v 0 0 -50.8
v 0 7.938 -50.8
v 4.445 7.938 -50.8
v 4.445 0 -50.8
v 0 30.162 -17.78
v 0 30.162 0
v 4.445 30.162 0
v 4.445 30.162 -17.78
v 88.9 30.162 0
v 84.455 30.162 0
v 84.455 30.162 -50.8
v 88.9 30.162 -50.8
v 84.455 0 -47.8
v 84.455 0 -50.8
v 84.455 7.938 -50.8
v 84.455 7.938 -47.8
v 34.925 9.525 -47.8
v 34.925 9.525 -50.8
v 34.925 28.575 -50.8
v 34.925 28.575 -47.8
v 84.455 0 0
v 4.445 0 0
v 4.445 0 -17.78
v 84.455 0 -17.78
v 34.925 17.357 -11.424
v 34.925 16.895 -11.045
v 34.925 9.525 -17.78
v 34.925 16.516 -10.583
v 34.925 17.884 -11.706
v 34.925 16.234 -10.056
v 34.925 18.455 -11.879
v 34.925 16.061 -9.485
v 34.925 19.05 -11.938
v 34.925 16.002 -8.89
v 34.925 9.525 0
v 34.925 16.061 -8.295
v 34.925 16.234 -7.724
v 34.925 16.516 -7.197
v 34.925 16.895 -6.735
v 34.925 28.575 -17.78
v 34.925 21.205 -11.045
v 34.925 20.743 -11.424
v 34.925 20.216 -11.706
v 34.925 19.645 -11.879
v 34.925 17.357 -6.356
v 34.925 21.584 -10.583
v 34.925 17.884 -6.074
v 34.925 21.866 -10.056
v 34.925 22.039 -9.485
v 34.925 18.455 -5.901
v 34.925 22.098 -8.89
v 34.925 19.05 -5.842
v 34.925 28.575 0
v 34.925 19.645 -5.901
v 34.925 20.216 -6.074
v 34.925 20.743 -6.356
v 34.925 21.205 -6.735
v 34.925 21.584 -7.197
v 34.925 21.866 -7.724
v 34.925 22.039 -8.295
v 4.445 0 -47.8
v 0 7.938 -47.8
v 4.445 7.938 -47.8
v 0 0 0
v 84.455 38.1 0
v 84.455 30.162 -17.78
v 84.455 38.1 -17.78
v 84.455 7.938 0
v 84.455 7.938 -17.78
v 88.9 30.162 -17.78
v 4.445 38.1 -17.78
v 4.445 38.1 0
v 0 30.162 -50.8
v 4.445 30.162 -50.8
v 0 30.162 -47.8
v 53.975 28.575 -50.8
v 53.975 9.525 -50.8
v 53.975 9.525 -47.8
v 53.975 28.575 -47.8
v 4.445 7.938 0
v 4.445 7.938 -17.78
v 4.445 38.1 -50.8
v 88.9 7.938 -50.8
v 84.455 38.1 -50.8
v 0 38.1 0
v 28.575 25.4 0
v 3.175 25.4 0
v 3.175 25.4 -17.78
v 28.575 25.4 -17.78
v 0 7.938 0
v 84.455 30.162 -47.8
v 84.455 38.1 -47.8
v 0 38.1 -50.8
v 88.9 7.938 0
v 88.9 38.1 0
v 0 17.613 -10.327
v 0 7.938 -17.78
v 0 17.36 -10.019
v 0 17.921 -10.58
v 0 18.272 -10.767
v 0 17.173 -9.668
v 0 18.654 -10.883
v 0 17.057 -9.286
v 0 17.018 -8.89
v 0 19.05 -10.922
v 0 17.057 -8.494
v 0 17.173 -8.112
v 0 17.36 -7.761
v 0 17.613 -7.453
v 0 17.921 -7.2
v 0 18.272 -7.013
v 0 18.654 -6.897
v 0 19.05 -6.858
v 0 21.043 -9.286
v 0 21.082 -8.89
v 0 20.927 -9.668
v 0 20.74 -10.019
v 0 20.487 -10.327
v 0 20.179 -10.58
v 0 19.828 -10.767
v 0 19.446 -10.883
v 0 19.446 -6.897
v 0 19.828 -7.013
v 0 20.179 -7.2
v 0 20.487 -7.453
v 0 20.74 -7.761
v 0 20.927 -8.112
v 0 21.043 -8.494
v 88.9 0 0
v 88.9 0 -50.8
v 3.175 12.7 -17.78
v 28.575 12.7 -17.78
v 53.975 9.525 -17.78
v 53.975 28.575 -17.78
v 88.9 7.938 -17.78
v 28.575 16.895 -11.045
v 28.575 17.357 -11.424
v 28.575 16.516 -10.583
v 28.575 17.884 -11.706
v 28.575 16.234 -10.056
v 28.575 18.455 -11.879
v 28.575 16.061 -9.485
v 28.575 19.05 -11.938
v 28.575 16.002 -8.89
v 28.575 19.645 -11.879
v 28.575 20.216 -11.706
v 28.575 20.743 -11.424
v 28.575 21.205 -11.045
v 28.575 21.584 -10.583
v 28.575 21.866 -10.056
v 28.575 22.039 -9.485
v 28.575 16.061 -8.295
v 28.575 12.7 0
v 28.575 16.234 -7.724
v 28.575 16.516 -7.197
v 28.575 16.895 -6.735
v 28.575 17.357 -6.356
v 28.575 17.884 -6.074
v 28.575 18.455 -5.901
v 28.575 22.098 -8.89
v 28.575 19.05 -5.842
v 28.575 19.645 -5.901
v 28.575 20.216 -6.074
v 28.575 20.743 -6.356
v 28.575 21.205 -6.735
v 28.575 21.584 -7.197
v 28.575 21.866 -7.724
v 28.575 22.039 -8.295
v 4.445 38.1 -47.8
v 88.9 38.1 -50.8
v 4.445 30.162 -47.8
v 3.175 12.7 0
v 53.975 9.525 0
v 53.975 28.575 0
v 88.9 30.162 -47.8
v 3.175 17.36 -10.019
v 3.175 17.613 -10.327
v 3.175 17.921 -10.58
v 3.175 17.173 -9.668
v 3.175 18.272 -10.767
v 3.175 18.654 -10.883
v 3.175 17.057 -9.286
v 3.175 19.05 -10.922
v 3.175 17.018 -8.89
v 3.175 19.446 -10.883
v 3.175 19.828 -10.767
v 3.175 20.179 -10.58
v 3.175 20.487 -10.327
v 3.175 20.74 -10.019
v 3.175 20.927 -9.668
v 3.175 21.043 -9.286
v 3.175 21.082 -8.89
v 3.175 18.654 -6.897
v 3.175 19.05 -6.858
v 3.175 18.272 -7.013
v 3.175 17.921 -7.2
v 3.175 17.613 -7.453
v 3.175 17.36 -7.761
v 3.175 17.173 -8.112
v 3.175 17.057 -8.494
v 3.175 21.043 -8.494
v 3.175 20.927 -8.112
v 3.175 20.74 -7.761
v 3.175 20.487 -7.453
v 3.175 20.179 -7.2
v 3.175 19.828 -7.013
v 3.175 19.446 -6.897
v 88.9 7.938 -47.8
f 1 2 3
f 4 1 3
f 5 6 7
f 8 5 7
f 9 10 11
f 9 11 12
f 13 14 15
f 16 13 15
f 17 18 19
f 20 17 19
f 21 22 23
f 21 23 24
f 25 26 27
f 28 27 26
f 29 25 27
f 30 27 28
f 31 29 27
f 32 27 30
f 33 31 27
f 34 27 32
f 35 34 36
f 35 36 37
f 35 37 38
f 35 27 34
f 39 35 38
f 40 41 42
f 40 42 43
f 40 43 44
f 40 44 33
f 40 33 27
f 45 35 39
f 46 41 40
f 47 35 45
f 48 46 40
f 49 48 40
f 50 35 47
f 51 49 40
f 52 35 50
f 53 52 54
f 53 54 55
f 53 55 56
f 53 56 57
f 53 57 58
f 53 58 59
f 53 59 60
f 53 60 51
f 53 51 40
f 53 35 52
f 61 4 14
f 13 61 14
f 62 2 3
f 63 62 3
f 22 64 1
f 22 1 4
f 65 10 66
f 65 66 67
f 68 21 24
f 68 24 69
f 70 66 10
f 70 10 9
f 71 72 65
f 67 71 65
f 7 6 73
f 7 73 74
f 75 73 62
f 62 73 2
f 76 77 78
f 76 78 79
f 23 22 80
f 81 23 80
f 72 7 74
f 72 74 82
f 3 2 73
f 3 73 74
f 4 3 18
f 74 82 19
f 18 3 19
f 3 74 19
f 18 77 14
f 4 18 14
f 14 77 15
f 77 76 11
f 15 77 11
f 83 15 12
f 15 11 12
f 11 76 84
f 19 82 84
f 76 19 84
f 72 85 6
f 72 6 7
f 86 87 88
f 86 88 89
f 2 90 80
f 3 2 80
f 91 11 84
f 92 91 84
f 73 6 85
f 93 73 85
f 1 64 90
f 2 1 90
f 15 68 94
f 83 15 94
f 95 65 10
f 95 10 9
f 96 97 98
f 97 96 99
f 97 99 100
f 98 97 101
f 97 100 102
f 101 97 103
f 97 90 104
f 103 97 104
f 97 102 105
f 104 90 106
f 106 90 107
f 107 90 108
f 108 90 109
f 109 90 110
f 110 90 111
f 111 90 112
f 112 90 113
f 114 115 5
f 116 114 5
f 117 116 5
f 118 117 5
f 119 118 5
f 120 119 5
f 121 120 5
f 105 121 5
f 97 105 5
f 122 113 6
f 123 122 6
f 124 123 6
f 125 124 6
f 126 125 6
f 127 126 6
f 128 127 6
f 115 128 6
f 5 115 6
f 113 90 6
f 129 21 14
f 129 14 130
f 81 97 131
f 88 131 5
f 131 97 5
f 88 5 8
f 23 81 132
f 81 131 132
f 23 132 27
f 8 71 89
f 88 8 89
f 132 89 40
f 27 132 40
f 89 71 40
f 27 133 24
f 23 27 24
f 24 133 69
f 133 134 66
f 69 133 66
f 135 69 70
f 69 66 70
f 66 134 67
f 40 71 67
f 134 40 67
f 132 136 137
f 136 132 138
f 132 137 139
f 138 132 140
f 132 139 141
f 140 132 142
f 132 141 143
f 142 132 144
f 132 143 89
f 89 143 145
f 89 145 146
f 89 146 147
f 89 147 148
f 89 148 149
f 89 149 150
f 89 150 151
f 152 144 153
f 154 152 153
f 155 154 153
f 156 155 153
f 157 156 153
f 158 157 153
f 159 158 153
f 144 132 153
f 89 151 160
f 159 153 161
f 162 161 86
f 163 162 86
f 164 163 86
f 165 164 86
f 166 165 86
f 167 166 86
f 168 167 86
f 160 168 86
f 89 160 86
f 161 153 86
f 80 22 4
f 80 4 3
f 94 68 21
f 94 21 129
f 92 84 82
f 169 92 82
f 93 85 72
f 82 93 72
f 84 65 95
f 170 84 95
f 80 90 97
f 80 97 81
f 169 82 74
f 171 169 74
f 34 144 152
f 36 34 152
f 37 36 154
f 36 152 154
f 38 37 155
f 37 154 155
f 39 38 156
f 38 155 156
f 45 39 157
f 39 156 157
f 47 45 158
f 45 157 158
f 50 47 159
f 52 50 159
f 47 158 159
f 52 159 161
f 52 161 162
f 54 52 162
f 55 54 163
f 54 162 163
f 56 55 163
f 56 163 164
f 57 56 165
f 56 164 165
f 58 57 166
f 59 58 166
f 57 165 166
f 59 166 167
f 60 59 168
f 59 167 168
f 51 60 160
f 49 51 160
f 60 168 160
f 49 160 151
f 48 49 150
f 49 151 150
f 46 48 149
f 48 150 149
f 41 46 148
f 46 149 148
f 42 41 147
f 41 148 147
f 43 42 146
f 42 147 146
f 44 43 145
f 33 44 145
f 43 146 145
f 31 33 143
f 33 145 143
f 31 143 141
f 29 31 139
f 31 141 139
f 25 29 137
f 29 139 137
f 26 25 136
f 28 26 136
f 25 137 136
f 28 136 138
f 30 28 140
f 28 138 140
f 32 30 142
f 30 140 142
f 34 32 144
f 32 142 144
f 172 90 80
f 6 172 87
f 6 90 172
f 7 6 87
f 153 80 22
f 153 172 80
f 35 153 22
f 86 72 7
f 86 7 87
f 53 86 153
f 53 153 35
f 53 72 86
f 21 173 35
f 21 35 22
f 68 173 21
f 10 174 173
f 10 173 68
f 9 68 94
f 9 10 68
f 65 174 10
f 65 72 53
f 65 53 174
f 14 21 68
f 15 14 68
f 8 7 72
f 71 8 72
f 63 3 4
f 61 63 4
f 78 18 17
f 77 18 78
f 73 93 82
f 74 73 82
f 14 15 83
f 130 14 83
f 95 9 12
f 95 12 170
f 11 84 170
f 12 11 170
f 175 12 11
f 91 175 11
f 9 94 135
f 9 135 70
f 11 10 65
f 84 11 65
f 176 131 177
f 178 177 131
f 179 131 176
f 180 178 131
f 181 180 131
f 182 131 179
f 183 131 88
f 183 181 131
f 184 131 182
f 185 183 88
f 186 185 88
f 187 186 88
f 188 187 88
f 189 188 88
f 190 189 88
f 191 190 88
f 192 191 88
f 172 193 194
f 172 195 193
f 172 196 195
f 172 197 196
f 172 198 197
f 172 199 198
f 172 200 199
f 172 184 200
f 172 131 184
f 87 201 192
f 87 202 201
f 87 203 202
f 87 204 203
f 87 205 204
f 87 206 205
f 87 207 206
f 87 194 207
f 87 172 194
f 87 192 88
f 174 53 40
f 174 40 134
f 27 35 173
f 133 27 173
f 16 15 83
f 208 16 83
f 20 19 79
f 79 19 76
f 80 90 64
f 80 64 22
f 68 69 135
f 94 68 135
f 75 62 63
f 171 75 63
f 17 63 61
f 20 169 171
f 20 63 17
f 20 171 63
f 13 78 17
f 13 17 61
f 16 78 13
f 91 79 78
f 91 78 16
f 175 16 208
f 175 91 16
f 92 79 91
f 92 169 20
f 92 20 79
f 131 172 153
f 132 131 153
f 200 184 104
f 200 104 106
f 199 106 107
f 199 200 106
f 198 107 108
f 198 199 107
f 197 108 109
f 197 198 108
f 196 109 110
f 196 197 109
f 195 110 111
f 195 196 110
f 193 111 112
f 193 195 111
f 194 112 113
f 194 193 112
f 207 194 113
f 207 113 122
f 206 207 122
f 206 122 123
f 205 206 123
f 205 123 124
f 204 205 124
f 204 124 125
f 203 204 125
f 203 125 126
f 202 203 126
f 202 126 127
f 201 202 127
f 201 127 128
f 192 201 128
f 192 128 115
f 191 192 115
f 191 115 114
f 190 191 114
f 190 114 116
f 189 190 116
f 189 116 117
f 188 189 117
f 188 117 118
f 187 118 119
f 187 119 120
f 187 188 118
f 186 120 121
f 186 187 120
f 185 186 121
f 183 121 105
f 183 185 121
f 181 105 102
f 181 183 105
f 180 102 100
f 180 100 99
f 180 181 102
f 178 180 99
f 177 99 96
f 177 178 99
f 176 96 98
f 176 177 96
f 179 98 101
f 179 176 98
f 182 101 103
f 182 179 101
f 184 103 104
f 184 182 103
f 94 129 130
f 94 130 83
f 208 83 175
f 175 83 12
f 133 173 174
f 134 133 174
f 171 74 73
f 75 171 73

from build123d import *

# Parameters (mm, degrees)
SKETCH1_W                = 88.9
SKETCH1_H                = 38.1
BOSS_EXTRUDE1_DEPTH      = 17.78
SKETCH2_W                = 4.445
SKETCH2_H                = 8.89
SKETCH2_W_2              = 19.05
SKETCH2_H_2              = 19.05
SKETCH2_W_3              = 25.4
SKETCH2_H_3              = 12.7
CUT_EXTRUDE1_DEPTH       = 20.32
SKETCH3_W                = 19.05
SKETCH3_H                = 19.05
BOSS_EXTRUDE2_DEPTH      = 3
SKETCH6_R                = 2.032
SPRINGPLUNGER_HOLE_DEPTH = 4.445
SKETCH8_W                = 4.445
SKETCH8_H                = 7.9375
SUPPORT_DEPTH            = 50.8
SUPPORT_2_DEPTH          = 50.8
SUPPORT_3_DEPTH          = 50.8
SUPPORT_4_DEPTH          = 50.8
SKETCH9_R                = 3.048
CUT_EXTRUDE4_DEPTH       = 6.35


with BuildPart() as part:
    # Sketch1 → Boss-Extrude1 (new body)
    with BuildSketch(Plane.XY):
        with Locations((44.45, 19.05)):
            Rectangle(SKETCH1_W, SKETCH1_H)
    extrude(amount=-BOSS_EXTRUDE1_DEPTH)

    # Sketch2 → Cut-Extrude1 (cut)
    with BuildSketch(Plane.XY):
        with Locations((86.6775, 34.6075)):
            Rectangle(SKETCH2_W, SKETCH2_H)
        with Locations((44.45, 19.05)):
            Rectangle(SKETCH2_W_2, SKETCH2_H_2)
        with Locations((2.2225, 34.6075)):
            Rectangle(SKETCH2_W, SKETCH2_H)
        with Locations((86.6775, 3.4925)):
            Rectangle(SKETCH2_W, SKETCH2_H)
        with Locations((2.2225, 3.4925)):
            Rectangle(SKETCH2_W, SKETCH2_H)
        with Locations((15.875, 19.05)):
            Rectangle(SKETCH2_W_3, SKETCH2_H_3)
    extrude(amount=-CUT_EXTRUDE1_DEPTH, mode=Mode.SUBTRACT)

    # Sketch6 → SpringPlunger Hole (cut)
    with BuildSketch(Plane.ZY.offset(-4.445)):
        with Locations(Location((-8.89, 19.05, 0), (0, 0, 270))):
            Circle(SKETCH6_R)
    extrude(amount=SPRINGPLUNGER_HOLE_DEPTH, mode=Mode.SUBTRACT)

    # Sketch9 → Cut-Extrude4 (cut)
    with BuildSketch(Plane.ZY.offset(-28.575)):
        with Locations(Location((-8.89, 19.05, 0), (0, 0, 270))):
            Circle(SKETCH9_R)
    extrude(amount=-CUT_EXTRUDE4_DEPTH, mode=Mode.SUBTRACT)


with BuildPart() as body_2:
    # Sketch3 → Boss-Extrude2 (new body)
    with BuildSketch(Plane.XY.offset(-50.8)):
        Polygon((88.9, 30.1625), (84.455, 30.1625), (84.455, 38.1), (4.445, 38.1), (4.445, 30.1625), (0, 30.1625), (0, 7.9375), (4.445, 7.9375), (4.445, 0), (84.455, 0), (84.455, 7.9375), (88.9, 7.9375), align=None)
        with Locations((44.45, 19.05)):
            Rectangle(SKETCH3_W, SKETCH3_H, mode=Mode.SUBTRACT)
    extrude(amount=BOSS_EXTRUDE2_DEPTH)


with BuildPart() as body_3:
    # Sketch8 → Support (new body)
    with BuildSketch(Plane.XY):
        with Locations((2.2225, 34.13125)):
            Rectangle(SKETCH8_W, SKETCH8_H)
    extrude(amount=-SUPPORT_DEPTH)


with BuildPart() as body_4:
    # Sketch8 → Support 2 (new body)
    with BuildSketch(Plane.XY):
        with Locations((86.6775, 34.13125)):
            Rectangle(SKETCH8_W, SKETCH8_H)
    extrude(amount=-SUPPORT_2_DEPTH)


with BuildPart() as body_5:
    # Sketch8 → Support 3 (new body)
    with BuildSketch(Plane.XY):
        with Locations((86.6775, 3.96875)):
            Rectangle(SKETCH8_W, SKETCH8_H)
    extrude(amount=-SUPPORT_3_DEPTH)


with BuildPart() as body_6:
    # Sketch8 → Support 4 (new body)
    with BuildSketch(Plane.XY):
        with Locations((2.2225, 3.96875)):
            Rectangle(SKETCH8_W, SKETCH8_H)
    extrude(amount=-SUPPORT_4_DEPTH)


solid = Compound([part.part, body_2.part, body_3.part, body_4.part, body_5.part, body_6.part])
